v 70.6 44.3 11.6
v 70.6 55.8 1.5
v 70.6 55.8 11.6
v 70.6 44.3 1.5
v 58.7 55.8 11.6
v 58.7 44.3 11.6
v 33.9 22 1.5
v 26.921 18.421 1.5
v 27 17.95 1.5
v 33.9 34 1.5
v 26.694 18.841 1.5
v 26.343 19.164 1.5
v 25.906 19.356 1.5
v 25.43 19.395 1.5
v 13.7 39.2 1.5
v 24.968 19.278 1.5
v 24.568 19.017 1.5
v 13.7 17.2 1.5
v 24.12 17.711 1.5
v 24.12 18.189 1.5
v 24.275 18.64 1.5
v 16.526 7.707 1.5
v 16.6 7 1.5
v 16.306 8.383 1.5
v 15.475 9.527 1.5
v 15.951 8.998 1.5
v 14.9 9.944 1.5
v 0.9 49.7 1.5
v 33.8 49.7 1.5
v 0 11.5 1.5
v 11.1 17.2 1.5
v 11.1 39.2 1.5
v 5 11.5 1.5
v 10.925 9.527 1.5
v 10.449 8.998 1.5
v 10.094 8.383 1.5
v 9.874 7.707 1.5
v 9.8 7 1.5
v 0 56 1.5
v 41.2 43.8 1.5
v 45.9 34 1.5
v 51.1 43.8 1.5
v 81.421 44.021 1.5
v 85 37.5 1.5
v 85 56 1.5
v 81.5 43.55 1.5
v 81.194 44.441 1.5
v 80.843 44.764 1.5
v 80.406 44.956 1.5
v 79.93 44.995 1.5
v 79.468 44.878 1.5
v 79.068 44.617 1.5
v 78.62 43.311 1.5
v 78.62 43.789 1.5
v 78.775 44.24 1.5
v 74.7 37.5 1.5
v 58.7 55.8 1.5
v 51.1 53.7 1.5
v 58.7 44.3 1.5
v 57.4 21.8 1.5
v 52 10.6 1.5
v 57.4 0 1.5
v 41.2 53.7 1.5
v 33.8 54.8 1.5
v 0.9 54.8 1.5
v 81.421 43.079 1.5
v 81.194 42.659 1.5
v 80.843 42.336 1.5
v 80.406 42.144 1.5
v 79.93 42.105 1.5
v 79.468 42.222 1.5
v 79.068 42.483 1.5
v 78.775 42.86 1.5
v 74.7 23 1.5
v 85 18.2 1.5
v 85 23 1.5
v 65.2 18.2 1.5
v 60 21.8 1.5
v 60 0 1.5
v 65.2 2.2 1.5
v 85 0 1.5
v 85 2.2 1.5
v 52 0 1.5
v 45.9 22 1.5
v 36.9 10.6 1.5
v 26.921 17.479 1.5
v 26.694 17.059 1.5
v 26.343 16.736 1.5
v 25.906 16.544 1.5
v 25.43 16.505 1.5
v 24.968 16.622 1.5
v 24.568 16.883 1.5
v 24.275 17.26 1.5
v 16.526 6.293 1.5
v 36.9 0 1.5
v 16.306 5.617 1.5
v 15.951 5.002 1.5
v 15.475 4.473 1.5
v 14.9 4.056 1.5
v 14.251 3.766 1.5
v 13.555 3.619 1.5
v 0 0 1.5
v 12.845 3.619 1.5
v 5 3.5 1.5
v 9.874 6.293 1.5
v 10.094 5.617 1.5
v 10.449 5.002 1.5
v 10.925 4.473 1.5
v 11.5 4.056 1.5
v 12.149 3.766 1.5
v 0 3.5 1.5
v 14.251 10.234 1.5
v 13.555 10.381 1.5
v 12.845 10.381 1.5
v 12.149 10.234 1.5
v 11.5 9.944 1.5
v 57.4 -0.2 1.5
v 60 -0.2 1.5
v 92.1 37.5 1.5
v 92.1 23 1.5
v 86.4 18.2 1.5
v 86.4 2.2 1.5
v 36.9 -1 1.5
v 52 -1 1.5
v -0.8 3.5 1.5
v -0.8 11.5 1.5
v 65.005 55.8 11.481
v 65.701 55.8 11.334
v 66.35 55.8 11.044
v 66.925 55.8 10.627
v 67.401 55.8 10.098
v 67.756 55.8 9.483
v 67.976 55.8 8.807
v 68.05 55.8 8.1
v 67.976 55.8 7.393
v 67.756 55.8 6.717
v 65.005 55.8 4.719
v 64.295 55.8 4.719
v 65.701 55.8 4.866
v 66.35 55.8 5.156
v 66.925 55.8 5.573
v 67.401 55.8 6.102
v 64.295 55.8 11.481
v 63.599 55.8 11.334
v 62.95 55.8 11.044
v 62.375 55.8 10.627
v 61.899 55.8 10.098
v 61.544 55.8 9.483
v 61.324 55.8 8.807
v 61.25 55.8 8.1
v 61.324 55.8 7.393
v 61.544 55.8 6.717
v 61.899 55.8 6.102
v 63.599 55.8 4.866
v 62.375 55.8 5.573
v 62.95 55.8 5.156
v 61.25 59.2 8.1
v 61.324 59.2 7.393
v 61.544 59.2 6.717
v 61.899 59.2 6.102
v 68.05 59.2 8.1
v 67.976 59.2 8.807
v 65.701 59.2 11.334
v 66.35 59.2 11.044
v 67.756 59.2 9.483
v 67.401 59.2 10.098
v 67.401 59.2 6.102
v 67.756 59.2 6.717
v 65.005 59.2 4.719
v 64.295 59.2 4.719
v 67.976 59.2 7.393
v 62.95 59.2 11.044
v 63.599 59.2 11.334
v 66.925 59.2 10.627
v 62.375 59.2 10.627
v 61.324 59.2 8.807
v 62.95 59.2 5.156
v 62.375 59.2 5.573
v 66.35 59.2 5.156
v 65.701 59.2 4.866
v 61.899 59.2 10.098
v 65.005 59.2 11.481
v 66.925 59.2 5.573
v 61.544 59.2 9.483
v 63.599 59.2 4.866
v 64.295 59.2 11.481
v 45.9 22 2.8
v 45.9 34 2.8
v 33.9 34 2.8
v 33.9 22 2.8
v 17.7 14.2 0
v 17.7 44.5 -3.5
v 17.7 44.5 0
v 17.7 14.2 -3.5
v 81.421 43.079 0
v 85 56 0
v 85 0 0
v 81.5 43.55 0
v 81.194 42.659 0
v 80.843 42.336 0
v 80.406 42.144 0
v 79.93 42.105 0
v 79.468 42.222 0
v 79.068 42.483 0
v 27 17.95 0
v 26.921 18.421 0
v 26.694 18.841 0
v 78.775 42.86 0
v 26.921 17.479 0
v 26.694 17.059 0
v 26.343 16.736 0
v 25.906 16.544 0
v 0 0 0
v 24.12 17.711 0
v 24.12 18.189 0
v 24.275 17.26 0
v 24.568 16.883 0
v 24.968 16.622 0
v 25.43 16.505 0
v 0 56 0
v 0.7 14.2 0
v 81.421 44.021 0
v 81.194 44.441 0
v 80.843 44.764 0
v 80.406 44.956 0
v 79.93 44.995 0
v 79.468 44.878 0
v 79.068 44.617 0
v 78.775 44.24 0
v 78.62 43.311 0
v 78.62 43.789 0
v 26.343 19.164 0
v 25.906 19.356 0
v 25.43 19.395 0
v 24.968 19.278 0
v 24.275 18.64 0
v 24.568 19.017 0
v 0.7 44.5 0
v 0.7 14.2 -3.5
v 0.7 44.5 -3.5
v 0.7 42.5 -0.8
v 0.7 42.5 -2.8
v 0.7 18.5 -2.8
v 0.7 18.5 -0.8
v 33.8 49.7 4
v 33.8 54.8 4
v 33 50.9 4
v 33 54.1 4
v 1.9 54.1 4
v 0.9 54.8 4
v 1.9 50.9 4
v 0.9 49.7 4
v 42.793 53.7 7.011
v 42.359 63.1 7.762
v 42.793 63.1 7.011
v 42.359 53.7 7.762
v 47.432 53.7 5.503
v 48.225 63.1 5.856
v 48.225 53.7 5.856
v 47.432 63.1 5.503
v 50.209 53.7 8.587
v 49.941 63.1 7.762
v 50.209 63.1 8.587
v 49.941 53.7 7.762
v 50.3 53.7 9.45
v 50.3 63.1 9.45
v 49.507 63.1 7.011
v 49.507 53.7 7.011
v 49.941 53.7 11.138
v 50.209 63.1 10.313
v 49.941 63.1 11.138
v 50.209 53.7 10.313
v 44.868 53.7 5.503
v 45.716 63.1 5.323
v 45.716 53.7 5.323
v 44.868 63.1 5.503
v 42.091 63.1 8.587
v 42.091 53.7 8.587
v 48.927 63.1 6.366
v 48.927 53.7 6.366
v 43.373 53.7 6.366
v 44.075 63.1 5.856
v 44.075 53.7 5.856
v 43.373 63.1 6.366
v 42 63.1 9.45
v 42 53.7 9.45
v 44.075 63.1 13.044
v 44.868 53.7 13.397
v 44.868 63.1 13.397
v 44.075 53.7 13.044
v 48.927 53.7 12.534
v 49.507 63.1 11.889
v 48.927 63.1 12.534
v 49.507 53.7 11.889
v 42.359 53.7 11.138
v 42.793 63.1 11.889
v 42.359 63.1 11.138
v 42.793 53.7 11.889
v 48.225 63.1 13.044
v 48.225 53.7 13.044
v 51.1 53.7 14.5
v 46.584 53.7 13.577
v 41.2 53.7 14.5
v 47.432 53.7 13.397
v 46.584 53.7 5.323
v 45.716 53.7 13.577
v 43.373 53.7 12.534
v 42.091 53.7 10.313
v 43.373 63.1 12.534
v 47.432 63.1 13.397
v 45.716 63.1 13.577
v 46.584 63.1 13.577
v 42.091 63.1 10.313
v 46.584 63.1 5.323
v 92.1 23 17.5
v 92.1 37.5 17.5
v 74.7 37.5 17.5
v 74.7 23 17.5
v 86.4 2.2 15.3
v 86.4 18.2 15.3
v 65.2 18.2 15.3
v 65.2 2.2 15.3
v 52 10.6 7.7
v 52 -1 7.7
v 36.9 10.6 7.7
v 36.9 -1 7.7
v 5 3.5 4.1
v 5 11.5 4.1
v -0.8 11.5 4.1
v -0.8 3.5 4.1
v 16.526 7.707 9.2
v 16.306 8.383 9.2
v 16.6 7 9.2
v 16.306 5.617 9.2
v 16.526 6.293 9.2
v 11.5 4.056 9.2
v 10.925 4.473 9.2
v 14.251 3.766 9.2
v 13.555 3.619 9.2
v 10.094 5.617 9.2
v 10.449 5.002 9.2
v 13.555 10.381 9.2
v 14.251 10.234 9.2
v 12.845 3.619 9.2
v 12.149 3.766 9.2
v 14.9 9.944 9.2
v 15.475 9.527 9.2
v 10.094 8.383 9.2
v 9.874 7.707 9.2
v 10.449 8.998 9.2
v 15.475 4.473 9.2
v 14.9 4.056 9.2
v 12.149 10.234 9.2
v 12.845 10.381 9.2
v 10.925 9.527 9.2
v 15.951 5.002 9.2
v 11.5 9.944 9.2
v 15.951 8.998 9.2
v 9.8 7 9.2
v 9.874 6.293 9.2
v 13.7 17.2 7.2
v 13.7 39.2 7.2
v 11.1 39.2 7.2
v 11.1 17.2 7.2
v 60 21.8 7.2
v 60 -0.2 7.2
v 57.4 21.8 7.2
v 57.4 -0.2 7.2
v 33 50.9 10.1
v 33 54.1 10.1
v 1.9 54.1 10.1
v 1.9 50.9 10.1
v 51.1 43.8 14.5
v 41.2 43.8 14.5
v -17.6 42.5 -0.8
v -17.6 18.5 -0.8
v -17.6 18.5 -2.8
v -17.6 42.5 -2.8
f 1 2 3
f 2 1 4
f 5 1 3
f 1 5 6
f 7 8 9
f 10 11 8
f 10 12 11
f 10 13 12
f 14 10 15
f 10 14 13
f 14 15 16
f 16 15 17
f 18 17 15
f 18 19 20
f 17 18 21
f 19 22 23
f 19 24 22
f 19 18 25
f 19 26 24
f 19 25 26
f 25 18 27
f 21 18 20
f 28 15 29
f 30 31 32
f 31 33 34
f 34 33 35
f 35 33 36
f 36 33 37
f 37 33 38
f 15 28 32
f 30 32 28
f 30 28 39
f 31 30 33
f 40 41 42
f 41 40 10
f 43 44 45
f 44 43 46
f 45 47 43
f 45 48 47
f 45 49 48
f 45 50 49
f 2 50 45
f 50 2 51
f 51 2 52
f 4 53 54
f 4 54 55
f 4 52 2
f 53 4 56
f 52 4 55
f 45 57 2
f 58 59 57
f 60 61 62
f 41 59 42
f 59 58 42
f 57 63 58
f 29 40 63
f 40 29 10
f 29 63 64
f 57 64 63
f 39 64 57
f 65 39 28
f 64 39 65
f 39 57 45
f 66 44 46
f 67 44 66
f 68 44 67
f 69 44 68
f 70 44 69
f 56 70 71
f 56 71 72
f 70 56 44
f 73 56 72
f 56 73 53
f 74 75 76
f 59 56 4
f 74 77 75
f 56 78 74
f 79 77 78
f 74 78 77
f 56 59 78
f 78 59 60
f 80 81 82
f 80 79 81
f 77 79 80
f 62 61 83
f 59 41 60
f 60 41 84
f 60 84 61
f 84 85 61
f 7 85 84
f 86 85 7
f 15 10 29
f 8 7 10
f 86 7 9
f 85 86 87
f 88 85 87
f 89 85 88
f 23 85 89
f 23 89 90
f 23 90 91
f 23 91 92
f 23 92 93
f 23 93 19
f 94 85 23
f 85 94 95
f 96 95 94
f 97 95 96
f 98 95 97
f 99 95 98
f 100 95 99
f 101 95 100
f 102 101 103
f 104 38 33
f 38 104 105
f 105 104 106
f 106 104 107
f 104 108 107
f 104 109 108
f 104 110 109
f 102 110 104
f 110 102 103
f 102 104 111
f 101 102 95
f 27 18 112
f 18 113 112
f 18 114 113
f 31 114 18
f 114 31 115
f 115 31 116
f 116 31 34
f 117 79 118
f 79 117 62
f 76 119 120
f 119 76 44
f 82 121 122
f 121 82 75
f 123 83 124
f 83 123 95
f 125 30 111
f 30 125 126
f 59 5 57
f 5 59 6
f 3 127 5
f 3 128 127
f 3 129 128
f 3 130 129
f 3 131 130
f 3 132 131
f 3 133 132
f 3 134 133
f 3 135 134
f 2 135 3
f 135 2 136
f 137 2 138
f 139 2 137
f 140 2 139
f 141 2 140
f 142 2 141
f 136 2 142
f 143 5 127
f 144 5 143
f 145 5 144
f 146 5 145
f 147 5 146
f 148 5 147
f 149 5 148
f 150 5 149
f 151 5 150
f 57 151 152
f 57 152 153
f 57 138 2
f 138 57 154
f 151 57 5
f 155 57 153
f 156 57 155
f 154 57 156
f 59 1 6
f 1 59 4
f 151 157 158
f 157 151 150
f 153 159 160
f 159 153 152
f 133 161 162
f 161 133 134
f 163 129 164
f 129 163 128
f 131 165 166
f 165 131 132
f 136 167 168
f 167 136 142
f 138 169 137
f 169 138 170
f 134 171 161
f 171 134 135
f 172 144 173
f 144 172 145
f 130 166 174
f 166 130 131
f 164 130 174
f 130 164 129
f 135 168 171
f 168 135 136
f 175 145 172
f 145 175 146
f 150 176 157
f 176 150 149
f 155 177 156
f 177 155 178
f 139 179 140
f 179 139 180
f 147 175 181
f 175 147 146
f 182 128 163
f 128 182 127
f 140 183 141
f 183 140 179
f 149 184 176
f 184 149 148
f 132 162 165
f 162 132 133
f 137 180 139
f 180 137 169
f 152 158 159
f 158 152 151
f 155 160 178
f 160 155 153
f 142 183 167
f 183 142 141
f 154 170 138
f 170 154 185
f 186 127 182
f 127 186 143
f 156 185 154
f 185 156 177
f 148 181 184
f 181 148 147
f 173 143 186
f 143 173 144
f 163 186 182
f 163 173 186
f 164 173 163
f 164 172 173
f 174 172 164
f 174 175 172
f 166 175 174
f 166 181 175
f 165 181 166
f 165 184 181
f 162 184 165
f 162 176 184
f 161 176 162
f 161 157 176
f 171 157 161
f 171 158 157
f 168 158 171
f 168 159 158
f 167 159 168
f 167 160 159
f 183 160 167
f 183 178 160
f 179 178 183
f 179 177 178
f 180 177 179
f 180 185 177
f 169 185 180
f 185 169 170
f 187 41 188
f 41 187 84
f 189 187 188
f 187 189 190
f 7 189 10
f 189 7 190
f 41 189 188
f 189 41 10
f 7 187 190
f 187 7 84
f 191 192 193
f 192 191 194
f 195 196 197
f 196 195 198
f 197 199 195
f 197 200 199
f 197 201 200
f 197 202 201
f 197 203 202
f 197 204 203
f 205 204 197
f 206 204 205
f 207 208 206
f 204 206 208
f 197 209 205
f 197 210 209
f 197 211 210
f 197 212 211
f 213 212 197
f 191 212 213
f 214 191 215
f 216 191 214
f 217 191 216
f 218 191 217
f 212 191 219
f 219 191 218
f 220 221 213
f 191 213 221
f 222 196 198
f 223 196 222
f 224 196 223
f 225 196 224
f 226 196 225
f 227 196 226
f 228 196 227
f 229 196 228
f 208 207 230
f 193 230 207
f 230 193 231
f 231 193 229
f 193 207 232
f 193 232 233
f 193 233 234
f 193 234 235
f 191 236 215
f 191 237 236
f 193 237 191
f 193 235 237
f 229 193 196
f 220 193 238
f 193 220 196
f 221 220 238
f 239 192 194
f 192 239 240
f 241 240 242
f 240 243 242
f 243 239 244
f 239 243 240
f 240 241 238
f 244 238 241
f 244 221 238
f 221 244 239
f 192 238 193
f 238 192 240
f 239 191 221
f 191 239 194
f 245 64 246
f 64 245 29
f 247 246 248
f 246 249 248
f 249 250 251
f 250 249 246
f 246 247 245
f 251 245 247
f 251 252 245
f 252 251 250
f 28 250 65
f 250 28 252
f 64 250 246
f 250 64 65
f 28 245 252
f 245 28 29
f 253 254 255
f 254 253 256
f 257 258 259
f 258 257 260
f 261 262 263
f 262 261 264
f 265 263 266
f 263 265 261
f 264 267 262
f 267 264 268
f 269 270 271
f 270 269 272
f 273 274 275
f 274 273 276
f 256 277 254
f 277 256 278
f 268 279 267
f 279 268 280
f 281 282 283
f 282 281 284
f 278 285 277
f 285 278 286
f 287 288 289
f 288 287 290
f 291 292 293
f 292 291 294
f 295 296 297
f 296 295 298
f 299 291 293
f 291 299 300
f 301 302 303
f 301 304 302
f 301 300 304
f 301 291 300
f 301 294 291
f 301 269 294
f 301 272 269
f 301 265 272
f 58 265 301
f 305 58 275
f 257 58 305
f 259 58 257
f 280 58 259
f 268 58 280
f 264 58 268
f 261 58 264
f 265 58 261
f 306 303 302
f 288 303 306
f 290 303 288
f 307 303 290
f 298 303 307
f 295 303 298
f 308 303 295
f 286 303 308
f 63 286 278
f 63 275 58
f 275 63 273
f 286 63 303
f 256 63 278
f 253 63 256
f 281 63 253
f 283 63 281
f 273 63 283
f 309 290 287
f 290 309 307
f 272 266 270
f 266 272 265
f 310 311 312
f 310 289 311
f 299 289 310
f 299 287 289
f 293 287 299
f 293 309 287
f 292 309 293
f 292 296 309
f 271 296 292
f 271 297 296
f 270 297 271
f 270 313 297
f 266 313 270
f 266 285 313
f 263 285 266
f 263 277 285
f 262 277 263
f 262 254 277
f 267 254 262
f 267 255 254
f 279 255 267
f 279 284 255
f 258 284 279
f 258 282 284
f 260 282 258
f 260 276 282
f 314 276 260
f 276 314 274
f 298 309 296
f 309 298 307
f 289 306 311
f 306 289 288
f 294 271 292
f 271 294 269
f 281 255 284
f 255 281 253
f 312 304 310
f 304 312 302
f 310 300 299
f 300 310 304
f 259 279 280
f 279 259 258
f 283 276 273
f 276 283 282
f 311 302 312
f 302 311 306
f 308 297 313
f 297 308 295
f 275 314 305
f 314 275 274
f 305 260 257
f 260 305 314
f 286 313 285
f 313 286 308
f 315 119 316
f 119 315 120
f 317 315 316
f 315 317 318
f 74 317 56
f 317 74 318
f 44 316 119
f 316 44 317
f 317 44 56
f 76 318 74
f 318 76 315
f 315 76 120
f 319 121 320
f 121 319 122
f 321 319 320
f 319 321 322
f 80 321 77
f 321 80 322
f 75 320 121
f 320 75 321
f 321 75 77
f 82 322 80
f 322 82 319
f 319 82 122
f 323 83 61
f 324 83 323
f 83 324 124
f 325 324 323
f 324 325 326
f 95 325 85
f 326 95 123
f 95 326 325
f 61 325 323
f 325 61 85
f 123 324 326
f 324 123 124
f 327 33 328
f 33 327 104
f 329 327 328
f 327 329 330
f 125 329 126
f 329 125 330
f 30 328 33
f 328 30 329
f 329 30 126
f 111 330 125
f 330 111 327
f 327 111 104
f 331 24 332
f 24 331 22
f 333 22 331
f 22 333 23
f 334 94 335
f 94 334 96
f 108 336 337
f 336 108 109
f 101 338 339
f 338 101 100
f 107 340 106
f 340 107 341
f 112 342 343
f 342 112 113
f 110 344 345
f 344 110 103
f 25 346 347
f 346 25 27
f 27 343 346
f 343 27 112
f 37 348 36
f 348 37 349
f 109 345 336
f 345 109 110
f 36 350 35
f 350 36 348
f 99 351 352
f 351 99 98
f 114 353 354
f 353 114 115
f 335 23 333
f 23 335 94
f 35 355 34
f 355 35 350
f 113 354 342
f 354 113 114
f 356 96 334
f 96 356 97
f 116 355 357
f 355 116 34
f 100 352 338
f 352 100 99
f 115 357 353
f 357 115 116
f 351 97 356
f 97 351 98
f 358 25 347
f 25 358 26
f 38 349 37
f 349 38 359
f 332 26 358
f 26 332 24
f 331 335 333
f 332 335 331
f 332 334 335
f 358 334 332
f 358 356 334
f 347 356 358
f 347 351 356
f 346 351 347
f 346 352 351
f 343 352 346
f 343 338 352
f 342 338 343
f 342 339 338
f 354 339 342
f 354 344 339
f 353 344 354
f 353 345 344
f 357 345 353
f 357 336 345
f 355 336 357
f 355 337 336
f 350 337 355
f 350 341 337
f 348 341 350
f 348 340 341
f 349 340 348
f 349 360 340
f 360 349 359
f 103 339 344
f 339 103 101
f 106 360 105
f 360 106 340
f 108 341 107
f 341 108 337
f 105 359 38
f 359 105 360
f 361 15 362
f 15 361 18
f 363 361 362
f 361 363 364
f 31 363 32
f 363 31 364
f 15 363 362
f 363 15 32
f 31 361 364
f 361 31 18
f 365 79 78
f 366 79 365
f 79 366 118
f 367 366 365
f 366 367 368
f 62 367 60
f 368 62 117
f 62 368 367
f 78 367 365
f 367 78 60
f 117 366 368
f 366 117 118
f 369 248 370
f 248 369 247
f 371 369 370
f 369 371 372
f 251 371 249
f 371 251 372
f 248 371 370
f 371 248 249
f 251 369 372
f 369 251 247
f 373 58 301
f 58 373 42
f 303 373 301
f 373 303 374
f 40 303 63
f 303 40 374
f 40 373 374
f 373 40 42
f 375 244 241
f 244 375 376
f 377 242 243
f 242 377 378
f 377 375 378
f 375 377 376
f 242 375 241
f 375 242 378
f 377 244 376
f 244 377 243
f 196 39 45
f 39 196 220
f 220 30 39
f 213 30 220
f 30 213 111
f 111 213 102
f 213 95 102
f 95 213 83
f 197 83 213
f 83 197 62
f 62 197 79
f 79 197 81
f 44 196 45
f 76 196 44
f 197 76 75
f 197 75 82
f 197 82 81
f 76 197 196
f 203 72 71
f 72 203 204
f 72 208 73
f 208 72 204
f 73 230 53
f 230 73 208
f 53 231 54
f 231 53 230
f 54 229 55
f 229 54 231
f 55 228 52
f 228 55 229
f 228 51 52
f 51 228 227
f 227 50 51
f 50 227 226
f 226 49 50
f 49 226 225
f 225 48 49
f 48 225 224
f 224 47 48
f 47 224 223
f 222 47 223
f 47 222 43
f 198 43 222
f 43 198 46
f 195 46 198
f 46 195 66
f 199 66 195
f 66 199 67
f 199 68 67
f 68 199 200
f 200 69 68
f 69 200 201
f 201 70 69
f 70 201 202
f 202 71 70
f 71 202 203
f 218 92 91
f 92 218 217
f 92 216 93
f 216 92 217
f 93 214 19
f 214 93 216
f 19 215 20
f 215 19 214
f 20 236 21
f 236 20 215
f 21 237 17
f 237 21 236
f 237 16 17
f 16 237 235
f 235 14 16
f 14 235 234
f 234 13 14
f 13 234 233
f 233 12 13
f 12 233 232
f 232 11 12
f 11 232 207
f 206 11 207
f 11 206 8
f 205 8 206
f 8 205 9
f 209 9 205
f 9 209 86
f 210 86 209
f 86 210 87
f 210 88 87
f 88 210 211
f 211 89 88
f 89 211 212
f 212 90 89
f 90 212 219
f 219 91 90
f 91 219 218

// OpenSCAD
/* Measurements were made with calipers and rounded to the nearest 0.1 mm */

$fs = 0.5;

module board()
{
  board_size = [ 85, 56, 1.5 ];
  mount_hole_radius = 2.9 / 2;
  hole_1_position = [ 24.1 + mount_hole_radius,
                      16.5 + mount_hole_radius,
                    ];
  hole_2_position = [ board_size[0] - 3.5 - mount_hole_radius,
                      board_size[1] - 11 - mount_hole_radius,
                    ];
  leave_space_under = 3.7; // mm tallest component raised away from bottom surface of board
  cpu_size = [ 12, 12, 1.3 ];
  cpu_position = [ board_size[0] + 7.1 - 46.2 - cpu_size[0],
                   board_size[1] - 22 - cpu_size[1],
                   0,
                 ];
  usb_size = [ 17.4, 14.5, 16 ];
  usb_position = [ board_size[0] + 7.1 - usb_size[0],
                   board_size[1] - 18.5 - usb_size[1],
                   0,
                 ];
  ethernet_size = [ 21.2, 16, 13.8 ];
  ethernet_position = [ board_size[0] + 1.4 - ethernet_size[0], 2.2, 0 ];
  hdmi_size = [ 15.1, 11.6, 6.2 ];
  hdmi_position = [ 36.9, -1.0, 0 ];
  gpio_size = [ 32.9, 5.1, 2.5 ];
  gpio_position = [ 0.9, board_size[1] - 1.2 - gpio_size[1], 0 ];
  pins_size = [ 31.1, 3.2, 6.1 ];
  pins_position = gpio_position + [ 1, 1.2, gpio_size[2] ];
  otg_size = [ 5.8, 8.0, 2.6 ];
  otg_position = [ -0.8, 3.5, 0 ];
  sd_socket_size = [ 17, 30.3, 3.5 ];
  sd_socket_position = [ 0.7, 14.2, - board_size[2] - sd_socket_size[2] ];
  rca_size = [ 9.9, 9.9, 13 ];
  rca_radius = 8.3 / 2;
  audio_size = [ 11.9, 11.5, 10.1 ];
  audio_position = [ 58.7, board_size[1] - 0.2 - audio_size[1], 0 ];
  audio_radius = 6.8 / 2;
  rca_position = [ 41.2, board_size[1] - rca_size[1] - 2.3, 0 ];
  sd_card_size = [ 32, 24, 2 ];
  sd_card_position = [ -17.6, 18.5, sd_socket_position[2] + 0.7 ];
  bypass_radius = 6.8 / 2;
  bypass_position = [ otg_position[0] + 10.6 + bypass_radius,
                      3.6 + bypass_radius,
                      0,
                    ];
  flex_size = [ 2.6, 22, 5.7 ];
  flex_1_position = [ 11.1, board_size[1] - flex_size[1] - 16.8, 0 ];
  flex_2_position = [ 57.4, -0.2, 0 ];
  black = [ 0.2, 0.2, 0.2 ]; // ..so shadows are apparent

  color("green")
  linear_extrude( height=board_size[2] )
  {
    difference()
    {
      square([ board_size[0], board_size[1] ]);
      translate( hole_1_position ) circle( r=mount_hole_radius );
      translate( hole_2_position ) circle( r=mount_hole_radius );
    }
  }
  translate([ 0, 0, board_size[2] ])
  {
    // The origin is now the top side of the board
    color( black )
    {
      translate( cpu_position ) cube( cpu_size );
      translate( sd_socket_position ) cube( sd_socket_size );
      translate( gpio_position ) cube( gpio_size );
      translate( audio_position )
      {
        cube( audio_size );
        translate([ audio_size[0]/2, audio_size[1], 4.7-board_size[2]+audio_radius ]) rotate([-90,0,0]) cylinder( r=audio_radius, h=3.4 );
      }
    }
    color("gold") translate( pins_position ) cube( pins_size );
    color("yellow") translate( rca_position ) cube( rca_size );
    color("blue") translate( sd_card_position ) cube( sd_card_size );
    color("silver")
    {
      translate( rca_position + [ rca_size[0]/2, rca_size[1], 3.8+rca_radius ] ) rotate([-90,0,0]) cylinder( r=rca_radius, h=9.4 );
      translate( usb_position ) cube( usb_size );
      translate( ethernet_position ) cube( ethernet_size );
      translate( hdmi_position ) cube( hdmi_size );
      translate( otg_position ) cube( otg_size );
      translate( bypass_position ) cylinder( r=6.8/2, h=7.7 );
    }
    color("white")
    {
      translate( flex_1_position ) cube( flex_size );
      translate( flex_2_position ) cube( flex_size );
    }
    // Show a warning zone for the highest component not explicitly modelled
    %cube([ board_size[0], board_size[1], 2.3 ]);
  }
}

board();
